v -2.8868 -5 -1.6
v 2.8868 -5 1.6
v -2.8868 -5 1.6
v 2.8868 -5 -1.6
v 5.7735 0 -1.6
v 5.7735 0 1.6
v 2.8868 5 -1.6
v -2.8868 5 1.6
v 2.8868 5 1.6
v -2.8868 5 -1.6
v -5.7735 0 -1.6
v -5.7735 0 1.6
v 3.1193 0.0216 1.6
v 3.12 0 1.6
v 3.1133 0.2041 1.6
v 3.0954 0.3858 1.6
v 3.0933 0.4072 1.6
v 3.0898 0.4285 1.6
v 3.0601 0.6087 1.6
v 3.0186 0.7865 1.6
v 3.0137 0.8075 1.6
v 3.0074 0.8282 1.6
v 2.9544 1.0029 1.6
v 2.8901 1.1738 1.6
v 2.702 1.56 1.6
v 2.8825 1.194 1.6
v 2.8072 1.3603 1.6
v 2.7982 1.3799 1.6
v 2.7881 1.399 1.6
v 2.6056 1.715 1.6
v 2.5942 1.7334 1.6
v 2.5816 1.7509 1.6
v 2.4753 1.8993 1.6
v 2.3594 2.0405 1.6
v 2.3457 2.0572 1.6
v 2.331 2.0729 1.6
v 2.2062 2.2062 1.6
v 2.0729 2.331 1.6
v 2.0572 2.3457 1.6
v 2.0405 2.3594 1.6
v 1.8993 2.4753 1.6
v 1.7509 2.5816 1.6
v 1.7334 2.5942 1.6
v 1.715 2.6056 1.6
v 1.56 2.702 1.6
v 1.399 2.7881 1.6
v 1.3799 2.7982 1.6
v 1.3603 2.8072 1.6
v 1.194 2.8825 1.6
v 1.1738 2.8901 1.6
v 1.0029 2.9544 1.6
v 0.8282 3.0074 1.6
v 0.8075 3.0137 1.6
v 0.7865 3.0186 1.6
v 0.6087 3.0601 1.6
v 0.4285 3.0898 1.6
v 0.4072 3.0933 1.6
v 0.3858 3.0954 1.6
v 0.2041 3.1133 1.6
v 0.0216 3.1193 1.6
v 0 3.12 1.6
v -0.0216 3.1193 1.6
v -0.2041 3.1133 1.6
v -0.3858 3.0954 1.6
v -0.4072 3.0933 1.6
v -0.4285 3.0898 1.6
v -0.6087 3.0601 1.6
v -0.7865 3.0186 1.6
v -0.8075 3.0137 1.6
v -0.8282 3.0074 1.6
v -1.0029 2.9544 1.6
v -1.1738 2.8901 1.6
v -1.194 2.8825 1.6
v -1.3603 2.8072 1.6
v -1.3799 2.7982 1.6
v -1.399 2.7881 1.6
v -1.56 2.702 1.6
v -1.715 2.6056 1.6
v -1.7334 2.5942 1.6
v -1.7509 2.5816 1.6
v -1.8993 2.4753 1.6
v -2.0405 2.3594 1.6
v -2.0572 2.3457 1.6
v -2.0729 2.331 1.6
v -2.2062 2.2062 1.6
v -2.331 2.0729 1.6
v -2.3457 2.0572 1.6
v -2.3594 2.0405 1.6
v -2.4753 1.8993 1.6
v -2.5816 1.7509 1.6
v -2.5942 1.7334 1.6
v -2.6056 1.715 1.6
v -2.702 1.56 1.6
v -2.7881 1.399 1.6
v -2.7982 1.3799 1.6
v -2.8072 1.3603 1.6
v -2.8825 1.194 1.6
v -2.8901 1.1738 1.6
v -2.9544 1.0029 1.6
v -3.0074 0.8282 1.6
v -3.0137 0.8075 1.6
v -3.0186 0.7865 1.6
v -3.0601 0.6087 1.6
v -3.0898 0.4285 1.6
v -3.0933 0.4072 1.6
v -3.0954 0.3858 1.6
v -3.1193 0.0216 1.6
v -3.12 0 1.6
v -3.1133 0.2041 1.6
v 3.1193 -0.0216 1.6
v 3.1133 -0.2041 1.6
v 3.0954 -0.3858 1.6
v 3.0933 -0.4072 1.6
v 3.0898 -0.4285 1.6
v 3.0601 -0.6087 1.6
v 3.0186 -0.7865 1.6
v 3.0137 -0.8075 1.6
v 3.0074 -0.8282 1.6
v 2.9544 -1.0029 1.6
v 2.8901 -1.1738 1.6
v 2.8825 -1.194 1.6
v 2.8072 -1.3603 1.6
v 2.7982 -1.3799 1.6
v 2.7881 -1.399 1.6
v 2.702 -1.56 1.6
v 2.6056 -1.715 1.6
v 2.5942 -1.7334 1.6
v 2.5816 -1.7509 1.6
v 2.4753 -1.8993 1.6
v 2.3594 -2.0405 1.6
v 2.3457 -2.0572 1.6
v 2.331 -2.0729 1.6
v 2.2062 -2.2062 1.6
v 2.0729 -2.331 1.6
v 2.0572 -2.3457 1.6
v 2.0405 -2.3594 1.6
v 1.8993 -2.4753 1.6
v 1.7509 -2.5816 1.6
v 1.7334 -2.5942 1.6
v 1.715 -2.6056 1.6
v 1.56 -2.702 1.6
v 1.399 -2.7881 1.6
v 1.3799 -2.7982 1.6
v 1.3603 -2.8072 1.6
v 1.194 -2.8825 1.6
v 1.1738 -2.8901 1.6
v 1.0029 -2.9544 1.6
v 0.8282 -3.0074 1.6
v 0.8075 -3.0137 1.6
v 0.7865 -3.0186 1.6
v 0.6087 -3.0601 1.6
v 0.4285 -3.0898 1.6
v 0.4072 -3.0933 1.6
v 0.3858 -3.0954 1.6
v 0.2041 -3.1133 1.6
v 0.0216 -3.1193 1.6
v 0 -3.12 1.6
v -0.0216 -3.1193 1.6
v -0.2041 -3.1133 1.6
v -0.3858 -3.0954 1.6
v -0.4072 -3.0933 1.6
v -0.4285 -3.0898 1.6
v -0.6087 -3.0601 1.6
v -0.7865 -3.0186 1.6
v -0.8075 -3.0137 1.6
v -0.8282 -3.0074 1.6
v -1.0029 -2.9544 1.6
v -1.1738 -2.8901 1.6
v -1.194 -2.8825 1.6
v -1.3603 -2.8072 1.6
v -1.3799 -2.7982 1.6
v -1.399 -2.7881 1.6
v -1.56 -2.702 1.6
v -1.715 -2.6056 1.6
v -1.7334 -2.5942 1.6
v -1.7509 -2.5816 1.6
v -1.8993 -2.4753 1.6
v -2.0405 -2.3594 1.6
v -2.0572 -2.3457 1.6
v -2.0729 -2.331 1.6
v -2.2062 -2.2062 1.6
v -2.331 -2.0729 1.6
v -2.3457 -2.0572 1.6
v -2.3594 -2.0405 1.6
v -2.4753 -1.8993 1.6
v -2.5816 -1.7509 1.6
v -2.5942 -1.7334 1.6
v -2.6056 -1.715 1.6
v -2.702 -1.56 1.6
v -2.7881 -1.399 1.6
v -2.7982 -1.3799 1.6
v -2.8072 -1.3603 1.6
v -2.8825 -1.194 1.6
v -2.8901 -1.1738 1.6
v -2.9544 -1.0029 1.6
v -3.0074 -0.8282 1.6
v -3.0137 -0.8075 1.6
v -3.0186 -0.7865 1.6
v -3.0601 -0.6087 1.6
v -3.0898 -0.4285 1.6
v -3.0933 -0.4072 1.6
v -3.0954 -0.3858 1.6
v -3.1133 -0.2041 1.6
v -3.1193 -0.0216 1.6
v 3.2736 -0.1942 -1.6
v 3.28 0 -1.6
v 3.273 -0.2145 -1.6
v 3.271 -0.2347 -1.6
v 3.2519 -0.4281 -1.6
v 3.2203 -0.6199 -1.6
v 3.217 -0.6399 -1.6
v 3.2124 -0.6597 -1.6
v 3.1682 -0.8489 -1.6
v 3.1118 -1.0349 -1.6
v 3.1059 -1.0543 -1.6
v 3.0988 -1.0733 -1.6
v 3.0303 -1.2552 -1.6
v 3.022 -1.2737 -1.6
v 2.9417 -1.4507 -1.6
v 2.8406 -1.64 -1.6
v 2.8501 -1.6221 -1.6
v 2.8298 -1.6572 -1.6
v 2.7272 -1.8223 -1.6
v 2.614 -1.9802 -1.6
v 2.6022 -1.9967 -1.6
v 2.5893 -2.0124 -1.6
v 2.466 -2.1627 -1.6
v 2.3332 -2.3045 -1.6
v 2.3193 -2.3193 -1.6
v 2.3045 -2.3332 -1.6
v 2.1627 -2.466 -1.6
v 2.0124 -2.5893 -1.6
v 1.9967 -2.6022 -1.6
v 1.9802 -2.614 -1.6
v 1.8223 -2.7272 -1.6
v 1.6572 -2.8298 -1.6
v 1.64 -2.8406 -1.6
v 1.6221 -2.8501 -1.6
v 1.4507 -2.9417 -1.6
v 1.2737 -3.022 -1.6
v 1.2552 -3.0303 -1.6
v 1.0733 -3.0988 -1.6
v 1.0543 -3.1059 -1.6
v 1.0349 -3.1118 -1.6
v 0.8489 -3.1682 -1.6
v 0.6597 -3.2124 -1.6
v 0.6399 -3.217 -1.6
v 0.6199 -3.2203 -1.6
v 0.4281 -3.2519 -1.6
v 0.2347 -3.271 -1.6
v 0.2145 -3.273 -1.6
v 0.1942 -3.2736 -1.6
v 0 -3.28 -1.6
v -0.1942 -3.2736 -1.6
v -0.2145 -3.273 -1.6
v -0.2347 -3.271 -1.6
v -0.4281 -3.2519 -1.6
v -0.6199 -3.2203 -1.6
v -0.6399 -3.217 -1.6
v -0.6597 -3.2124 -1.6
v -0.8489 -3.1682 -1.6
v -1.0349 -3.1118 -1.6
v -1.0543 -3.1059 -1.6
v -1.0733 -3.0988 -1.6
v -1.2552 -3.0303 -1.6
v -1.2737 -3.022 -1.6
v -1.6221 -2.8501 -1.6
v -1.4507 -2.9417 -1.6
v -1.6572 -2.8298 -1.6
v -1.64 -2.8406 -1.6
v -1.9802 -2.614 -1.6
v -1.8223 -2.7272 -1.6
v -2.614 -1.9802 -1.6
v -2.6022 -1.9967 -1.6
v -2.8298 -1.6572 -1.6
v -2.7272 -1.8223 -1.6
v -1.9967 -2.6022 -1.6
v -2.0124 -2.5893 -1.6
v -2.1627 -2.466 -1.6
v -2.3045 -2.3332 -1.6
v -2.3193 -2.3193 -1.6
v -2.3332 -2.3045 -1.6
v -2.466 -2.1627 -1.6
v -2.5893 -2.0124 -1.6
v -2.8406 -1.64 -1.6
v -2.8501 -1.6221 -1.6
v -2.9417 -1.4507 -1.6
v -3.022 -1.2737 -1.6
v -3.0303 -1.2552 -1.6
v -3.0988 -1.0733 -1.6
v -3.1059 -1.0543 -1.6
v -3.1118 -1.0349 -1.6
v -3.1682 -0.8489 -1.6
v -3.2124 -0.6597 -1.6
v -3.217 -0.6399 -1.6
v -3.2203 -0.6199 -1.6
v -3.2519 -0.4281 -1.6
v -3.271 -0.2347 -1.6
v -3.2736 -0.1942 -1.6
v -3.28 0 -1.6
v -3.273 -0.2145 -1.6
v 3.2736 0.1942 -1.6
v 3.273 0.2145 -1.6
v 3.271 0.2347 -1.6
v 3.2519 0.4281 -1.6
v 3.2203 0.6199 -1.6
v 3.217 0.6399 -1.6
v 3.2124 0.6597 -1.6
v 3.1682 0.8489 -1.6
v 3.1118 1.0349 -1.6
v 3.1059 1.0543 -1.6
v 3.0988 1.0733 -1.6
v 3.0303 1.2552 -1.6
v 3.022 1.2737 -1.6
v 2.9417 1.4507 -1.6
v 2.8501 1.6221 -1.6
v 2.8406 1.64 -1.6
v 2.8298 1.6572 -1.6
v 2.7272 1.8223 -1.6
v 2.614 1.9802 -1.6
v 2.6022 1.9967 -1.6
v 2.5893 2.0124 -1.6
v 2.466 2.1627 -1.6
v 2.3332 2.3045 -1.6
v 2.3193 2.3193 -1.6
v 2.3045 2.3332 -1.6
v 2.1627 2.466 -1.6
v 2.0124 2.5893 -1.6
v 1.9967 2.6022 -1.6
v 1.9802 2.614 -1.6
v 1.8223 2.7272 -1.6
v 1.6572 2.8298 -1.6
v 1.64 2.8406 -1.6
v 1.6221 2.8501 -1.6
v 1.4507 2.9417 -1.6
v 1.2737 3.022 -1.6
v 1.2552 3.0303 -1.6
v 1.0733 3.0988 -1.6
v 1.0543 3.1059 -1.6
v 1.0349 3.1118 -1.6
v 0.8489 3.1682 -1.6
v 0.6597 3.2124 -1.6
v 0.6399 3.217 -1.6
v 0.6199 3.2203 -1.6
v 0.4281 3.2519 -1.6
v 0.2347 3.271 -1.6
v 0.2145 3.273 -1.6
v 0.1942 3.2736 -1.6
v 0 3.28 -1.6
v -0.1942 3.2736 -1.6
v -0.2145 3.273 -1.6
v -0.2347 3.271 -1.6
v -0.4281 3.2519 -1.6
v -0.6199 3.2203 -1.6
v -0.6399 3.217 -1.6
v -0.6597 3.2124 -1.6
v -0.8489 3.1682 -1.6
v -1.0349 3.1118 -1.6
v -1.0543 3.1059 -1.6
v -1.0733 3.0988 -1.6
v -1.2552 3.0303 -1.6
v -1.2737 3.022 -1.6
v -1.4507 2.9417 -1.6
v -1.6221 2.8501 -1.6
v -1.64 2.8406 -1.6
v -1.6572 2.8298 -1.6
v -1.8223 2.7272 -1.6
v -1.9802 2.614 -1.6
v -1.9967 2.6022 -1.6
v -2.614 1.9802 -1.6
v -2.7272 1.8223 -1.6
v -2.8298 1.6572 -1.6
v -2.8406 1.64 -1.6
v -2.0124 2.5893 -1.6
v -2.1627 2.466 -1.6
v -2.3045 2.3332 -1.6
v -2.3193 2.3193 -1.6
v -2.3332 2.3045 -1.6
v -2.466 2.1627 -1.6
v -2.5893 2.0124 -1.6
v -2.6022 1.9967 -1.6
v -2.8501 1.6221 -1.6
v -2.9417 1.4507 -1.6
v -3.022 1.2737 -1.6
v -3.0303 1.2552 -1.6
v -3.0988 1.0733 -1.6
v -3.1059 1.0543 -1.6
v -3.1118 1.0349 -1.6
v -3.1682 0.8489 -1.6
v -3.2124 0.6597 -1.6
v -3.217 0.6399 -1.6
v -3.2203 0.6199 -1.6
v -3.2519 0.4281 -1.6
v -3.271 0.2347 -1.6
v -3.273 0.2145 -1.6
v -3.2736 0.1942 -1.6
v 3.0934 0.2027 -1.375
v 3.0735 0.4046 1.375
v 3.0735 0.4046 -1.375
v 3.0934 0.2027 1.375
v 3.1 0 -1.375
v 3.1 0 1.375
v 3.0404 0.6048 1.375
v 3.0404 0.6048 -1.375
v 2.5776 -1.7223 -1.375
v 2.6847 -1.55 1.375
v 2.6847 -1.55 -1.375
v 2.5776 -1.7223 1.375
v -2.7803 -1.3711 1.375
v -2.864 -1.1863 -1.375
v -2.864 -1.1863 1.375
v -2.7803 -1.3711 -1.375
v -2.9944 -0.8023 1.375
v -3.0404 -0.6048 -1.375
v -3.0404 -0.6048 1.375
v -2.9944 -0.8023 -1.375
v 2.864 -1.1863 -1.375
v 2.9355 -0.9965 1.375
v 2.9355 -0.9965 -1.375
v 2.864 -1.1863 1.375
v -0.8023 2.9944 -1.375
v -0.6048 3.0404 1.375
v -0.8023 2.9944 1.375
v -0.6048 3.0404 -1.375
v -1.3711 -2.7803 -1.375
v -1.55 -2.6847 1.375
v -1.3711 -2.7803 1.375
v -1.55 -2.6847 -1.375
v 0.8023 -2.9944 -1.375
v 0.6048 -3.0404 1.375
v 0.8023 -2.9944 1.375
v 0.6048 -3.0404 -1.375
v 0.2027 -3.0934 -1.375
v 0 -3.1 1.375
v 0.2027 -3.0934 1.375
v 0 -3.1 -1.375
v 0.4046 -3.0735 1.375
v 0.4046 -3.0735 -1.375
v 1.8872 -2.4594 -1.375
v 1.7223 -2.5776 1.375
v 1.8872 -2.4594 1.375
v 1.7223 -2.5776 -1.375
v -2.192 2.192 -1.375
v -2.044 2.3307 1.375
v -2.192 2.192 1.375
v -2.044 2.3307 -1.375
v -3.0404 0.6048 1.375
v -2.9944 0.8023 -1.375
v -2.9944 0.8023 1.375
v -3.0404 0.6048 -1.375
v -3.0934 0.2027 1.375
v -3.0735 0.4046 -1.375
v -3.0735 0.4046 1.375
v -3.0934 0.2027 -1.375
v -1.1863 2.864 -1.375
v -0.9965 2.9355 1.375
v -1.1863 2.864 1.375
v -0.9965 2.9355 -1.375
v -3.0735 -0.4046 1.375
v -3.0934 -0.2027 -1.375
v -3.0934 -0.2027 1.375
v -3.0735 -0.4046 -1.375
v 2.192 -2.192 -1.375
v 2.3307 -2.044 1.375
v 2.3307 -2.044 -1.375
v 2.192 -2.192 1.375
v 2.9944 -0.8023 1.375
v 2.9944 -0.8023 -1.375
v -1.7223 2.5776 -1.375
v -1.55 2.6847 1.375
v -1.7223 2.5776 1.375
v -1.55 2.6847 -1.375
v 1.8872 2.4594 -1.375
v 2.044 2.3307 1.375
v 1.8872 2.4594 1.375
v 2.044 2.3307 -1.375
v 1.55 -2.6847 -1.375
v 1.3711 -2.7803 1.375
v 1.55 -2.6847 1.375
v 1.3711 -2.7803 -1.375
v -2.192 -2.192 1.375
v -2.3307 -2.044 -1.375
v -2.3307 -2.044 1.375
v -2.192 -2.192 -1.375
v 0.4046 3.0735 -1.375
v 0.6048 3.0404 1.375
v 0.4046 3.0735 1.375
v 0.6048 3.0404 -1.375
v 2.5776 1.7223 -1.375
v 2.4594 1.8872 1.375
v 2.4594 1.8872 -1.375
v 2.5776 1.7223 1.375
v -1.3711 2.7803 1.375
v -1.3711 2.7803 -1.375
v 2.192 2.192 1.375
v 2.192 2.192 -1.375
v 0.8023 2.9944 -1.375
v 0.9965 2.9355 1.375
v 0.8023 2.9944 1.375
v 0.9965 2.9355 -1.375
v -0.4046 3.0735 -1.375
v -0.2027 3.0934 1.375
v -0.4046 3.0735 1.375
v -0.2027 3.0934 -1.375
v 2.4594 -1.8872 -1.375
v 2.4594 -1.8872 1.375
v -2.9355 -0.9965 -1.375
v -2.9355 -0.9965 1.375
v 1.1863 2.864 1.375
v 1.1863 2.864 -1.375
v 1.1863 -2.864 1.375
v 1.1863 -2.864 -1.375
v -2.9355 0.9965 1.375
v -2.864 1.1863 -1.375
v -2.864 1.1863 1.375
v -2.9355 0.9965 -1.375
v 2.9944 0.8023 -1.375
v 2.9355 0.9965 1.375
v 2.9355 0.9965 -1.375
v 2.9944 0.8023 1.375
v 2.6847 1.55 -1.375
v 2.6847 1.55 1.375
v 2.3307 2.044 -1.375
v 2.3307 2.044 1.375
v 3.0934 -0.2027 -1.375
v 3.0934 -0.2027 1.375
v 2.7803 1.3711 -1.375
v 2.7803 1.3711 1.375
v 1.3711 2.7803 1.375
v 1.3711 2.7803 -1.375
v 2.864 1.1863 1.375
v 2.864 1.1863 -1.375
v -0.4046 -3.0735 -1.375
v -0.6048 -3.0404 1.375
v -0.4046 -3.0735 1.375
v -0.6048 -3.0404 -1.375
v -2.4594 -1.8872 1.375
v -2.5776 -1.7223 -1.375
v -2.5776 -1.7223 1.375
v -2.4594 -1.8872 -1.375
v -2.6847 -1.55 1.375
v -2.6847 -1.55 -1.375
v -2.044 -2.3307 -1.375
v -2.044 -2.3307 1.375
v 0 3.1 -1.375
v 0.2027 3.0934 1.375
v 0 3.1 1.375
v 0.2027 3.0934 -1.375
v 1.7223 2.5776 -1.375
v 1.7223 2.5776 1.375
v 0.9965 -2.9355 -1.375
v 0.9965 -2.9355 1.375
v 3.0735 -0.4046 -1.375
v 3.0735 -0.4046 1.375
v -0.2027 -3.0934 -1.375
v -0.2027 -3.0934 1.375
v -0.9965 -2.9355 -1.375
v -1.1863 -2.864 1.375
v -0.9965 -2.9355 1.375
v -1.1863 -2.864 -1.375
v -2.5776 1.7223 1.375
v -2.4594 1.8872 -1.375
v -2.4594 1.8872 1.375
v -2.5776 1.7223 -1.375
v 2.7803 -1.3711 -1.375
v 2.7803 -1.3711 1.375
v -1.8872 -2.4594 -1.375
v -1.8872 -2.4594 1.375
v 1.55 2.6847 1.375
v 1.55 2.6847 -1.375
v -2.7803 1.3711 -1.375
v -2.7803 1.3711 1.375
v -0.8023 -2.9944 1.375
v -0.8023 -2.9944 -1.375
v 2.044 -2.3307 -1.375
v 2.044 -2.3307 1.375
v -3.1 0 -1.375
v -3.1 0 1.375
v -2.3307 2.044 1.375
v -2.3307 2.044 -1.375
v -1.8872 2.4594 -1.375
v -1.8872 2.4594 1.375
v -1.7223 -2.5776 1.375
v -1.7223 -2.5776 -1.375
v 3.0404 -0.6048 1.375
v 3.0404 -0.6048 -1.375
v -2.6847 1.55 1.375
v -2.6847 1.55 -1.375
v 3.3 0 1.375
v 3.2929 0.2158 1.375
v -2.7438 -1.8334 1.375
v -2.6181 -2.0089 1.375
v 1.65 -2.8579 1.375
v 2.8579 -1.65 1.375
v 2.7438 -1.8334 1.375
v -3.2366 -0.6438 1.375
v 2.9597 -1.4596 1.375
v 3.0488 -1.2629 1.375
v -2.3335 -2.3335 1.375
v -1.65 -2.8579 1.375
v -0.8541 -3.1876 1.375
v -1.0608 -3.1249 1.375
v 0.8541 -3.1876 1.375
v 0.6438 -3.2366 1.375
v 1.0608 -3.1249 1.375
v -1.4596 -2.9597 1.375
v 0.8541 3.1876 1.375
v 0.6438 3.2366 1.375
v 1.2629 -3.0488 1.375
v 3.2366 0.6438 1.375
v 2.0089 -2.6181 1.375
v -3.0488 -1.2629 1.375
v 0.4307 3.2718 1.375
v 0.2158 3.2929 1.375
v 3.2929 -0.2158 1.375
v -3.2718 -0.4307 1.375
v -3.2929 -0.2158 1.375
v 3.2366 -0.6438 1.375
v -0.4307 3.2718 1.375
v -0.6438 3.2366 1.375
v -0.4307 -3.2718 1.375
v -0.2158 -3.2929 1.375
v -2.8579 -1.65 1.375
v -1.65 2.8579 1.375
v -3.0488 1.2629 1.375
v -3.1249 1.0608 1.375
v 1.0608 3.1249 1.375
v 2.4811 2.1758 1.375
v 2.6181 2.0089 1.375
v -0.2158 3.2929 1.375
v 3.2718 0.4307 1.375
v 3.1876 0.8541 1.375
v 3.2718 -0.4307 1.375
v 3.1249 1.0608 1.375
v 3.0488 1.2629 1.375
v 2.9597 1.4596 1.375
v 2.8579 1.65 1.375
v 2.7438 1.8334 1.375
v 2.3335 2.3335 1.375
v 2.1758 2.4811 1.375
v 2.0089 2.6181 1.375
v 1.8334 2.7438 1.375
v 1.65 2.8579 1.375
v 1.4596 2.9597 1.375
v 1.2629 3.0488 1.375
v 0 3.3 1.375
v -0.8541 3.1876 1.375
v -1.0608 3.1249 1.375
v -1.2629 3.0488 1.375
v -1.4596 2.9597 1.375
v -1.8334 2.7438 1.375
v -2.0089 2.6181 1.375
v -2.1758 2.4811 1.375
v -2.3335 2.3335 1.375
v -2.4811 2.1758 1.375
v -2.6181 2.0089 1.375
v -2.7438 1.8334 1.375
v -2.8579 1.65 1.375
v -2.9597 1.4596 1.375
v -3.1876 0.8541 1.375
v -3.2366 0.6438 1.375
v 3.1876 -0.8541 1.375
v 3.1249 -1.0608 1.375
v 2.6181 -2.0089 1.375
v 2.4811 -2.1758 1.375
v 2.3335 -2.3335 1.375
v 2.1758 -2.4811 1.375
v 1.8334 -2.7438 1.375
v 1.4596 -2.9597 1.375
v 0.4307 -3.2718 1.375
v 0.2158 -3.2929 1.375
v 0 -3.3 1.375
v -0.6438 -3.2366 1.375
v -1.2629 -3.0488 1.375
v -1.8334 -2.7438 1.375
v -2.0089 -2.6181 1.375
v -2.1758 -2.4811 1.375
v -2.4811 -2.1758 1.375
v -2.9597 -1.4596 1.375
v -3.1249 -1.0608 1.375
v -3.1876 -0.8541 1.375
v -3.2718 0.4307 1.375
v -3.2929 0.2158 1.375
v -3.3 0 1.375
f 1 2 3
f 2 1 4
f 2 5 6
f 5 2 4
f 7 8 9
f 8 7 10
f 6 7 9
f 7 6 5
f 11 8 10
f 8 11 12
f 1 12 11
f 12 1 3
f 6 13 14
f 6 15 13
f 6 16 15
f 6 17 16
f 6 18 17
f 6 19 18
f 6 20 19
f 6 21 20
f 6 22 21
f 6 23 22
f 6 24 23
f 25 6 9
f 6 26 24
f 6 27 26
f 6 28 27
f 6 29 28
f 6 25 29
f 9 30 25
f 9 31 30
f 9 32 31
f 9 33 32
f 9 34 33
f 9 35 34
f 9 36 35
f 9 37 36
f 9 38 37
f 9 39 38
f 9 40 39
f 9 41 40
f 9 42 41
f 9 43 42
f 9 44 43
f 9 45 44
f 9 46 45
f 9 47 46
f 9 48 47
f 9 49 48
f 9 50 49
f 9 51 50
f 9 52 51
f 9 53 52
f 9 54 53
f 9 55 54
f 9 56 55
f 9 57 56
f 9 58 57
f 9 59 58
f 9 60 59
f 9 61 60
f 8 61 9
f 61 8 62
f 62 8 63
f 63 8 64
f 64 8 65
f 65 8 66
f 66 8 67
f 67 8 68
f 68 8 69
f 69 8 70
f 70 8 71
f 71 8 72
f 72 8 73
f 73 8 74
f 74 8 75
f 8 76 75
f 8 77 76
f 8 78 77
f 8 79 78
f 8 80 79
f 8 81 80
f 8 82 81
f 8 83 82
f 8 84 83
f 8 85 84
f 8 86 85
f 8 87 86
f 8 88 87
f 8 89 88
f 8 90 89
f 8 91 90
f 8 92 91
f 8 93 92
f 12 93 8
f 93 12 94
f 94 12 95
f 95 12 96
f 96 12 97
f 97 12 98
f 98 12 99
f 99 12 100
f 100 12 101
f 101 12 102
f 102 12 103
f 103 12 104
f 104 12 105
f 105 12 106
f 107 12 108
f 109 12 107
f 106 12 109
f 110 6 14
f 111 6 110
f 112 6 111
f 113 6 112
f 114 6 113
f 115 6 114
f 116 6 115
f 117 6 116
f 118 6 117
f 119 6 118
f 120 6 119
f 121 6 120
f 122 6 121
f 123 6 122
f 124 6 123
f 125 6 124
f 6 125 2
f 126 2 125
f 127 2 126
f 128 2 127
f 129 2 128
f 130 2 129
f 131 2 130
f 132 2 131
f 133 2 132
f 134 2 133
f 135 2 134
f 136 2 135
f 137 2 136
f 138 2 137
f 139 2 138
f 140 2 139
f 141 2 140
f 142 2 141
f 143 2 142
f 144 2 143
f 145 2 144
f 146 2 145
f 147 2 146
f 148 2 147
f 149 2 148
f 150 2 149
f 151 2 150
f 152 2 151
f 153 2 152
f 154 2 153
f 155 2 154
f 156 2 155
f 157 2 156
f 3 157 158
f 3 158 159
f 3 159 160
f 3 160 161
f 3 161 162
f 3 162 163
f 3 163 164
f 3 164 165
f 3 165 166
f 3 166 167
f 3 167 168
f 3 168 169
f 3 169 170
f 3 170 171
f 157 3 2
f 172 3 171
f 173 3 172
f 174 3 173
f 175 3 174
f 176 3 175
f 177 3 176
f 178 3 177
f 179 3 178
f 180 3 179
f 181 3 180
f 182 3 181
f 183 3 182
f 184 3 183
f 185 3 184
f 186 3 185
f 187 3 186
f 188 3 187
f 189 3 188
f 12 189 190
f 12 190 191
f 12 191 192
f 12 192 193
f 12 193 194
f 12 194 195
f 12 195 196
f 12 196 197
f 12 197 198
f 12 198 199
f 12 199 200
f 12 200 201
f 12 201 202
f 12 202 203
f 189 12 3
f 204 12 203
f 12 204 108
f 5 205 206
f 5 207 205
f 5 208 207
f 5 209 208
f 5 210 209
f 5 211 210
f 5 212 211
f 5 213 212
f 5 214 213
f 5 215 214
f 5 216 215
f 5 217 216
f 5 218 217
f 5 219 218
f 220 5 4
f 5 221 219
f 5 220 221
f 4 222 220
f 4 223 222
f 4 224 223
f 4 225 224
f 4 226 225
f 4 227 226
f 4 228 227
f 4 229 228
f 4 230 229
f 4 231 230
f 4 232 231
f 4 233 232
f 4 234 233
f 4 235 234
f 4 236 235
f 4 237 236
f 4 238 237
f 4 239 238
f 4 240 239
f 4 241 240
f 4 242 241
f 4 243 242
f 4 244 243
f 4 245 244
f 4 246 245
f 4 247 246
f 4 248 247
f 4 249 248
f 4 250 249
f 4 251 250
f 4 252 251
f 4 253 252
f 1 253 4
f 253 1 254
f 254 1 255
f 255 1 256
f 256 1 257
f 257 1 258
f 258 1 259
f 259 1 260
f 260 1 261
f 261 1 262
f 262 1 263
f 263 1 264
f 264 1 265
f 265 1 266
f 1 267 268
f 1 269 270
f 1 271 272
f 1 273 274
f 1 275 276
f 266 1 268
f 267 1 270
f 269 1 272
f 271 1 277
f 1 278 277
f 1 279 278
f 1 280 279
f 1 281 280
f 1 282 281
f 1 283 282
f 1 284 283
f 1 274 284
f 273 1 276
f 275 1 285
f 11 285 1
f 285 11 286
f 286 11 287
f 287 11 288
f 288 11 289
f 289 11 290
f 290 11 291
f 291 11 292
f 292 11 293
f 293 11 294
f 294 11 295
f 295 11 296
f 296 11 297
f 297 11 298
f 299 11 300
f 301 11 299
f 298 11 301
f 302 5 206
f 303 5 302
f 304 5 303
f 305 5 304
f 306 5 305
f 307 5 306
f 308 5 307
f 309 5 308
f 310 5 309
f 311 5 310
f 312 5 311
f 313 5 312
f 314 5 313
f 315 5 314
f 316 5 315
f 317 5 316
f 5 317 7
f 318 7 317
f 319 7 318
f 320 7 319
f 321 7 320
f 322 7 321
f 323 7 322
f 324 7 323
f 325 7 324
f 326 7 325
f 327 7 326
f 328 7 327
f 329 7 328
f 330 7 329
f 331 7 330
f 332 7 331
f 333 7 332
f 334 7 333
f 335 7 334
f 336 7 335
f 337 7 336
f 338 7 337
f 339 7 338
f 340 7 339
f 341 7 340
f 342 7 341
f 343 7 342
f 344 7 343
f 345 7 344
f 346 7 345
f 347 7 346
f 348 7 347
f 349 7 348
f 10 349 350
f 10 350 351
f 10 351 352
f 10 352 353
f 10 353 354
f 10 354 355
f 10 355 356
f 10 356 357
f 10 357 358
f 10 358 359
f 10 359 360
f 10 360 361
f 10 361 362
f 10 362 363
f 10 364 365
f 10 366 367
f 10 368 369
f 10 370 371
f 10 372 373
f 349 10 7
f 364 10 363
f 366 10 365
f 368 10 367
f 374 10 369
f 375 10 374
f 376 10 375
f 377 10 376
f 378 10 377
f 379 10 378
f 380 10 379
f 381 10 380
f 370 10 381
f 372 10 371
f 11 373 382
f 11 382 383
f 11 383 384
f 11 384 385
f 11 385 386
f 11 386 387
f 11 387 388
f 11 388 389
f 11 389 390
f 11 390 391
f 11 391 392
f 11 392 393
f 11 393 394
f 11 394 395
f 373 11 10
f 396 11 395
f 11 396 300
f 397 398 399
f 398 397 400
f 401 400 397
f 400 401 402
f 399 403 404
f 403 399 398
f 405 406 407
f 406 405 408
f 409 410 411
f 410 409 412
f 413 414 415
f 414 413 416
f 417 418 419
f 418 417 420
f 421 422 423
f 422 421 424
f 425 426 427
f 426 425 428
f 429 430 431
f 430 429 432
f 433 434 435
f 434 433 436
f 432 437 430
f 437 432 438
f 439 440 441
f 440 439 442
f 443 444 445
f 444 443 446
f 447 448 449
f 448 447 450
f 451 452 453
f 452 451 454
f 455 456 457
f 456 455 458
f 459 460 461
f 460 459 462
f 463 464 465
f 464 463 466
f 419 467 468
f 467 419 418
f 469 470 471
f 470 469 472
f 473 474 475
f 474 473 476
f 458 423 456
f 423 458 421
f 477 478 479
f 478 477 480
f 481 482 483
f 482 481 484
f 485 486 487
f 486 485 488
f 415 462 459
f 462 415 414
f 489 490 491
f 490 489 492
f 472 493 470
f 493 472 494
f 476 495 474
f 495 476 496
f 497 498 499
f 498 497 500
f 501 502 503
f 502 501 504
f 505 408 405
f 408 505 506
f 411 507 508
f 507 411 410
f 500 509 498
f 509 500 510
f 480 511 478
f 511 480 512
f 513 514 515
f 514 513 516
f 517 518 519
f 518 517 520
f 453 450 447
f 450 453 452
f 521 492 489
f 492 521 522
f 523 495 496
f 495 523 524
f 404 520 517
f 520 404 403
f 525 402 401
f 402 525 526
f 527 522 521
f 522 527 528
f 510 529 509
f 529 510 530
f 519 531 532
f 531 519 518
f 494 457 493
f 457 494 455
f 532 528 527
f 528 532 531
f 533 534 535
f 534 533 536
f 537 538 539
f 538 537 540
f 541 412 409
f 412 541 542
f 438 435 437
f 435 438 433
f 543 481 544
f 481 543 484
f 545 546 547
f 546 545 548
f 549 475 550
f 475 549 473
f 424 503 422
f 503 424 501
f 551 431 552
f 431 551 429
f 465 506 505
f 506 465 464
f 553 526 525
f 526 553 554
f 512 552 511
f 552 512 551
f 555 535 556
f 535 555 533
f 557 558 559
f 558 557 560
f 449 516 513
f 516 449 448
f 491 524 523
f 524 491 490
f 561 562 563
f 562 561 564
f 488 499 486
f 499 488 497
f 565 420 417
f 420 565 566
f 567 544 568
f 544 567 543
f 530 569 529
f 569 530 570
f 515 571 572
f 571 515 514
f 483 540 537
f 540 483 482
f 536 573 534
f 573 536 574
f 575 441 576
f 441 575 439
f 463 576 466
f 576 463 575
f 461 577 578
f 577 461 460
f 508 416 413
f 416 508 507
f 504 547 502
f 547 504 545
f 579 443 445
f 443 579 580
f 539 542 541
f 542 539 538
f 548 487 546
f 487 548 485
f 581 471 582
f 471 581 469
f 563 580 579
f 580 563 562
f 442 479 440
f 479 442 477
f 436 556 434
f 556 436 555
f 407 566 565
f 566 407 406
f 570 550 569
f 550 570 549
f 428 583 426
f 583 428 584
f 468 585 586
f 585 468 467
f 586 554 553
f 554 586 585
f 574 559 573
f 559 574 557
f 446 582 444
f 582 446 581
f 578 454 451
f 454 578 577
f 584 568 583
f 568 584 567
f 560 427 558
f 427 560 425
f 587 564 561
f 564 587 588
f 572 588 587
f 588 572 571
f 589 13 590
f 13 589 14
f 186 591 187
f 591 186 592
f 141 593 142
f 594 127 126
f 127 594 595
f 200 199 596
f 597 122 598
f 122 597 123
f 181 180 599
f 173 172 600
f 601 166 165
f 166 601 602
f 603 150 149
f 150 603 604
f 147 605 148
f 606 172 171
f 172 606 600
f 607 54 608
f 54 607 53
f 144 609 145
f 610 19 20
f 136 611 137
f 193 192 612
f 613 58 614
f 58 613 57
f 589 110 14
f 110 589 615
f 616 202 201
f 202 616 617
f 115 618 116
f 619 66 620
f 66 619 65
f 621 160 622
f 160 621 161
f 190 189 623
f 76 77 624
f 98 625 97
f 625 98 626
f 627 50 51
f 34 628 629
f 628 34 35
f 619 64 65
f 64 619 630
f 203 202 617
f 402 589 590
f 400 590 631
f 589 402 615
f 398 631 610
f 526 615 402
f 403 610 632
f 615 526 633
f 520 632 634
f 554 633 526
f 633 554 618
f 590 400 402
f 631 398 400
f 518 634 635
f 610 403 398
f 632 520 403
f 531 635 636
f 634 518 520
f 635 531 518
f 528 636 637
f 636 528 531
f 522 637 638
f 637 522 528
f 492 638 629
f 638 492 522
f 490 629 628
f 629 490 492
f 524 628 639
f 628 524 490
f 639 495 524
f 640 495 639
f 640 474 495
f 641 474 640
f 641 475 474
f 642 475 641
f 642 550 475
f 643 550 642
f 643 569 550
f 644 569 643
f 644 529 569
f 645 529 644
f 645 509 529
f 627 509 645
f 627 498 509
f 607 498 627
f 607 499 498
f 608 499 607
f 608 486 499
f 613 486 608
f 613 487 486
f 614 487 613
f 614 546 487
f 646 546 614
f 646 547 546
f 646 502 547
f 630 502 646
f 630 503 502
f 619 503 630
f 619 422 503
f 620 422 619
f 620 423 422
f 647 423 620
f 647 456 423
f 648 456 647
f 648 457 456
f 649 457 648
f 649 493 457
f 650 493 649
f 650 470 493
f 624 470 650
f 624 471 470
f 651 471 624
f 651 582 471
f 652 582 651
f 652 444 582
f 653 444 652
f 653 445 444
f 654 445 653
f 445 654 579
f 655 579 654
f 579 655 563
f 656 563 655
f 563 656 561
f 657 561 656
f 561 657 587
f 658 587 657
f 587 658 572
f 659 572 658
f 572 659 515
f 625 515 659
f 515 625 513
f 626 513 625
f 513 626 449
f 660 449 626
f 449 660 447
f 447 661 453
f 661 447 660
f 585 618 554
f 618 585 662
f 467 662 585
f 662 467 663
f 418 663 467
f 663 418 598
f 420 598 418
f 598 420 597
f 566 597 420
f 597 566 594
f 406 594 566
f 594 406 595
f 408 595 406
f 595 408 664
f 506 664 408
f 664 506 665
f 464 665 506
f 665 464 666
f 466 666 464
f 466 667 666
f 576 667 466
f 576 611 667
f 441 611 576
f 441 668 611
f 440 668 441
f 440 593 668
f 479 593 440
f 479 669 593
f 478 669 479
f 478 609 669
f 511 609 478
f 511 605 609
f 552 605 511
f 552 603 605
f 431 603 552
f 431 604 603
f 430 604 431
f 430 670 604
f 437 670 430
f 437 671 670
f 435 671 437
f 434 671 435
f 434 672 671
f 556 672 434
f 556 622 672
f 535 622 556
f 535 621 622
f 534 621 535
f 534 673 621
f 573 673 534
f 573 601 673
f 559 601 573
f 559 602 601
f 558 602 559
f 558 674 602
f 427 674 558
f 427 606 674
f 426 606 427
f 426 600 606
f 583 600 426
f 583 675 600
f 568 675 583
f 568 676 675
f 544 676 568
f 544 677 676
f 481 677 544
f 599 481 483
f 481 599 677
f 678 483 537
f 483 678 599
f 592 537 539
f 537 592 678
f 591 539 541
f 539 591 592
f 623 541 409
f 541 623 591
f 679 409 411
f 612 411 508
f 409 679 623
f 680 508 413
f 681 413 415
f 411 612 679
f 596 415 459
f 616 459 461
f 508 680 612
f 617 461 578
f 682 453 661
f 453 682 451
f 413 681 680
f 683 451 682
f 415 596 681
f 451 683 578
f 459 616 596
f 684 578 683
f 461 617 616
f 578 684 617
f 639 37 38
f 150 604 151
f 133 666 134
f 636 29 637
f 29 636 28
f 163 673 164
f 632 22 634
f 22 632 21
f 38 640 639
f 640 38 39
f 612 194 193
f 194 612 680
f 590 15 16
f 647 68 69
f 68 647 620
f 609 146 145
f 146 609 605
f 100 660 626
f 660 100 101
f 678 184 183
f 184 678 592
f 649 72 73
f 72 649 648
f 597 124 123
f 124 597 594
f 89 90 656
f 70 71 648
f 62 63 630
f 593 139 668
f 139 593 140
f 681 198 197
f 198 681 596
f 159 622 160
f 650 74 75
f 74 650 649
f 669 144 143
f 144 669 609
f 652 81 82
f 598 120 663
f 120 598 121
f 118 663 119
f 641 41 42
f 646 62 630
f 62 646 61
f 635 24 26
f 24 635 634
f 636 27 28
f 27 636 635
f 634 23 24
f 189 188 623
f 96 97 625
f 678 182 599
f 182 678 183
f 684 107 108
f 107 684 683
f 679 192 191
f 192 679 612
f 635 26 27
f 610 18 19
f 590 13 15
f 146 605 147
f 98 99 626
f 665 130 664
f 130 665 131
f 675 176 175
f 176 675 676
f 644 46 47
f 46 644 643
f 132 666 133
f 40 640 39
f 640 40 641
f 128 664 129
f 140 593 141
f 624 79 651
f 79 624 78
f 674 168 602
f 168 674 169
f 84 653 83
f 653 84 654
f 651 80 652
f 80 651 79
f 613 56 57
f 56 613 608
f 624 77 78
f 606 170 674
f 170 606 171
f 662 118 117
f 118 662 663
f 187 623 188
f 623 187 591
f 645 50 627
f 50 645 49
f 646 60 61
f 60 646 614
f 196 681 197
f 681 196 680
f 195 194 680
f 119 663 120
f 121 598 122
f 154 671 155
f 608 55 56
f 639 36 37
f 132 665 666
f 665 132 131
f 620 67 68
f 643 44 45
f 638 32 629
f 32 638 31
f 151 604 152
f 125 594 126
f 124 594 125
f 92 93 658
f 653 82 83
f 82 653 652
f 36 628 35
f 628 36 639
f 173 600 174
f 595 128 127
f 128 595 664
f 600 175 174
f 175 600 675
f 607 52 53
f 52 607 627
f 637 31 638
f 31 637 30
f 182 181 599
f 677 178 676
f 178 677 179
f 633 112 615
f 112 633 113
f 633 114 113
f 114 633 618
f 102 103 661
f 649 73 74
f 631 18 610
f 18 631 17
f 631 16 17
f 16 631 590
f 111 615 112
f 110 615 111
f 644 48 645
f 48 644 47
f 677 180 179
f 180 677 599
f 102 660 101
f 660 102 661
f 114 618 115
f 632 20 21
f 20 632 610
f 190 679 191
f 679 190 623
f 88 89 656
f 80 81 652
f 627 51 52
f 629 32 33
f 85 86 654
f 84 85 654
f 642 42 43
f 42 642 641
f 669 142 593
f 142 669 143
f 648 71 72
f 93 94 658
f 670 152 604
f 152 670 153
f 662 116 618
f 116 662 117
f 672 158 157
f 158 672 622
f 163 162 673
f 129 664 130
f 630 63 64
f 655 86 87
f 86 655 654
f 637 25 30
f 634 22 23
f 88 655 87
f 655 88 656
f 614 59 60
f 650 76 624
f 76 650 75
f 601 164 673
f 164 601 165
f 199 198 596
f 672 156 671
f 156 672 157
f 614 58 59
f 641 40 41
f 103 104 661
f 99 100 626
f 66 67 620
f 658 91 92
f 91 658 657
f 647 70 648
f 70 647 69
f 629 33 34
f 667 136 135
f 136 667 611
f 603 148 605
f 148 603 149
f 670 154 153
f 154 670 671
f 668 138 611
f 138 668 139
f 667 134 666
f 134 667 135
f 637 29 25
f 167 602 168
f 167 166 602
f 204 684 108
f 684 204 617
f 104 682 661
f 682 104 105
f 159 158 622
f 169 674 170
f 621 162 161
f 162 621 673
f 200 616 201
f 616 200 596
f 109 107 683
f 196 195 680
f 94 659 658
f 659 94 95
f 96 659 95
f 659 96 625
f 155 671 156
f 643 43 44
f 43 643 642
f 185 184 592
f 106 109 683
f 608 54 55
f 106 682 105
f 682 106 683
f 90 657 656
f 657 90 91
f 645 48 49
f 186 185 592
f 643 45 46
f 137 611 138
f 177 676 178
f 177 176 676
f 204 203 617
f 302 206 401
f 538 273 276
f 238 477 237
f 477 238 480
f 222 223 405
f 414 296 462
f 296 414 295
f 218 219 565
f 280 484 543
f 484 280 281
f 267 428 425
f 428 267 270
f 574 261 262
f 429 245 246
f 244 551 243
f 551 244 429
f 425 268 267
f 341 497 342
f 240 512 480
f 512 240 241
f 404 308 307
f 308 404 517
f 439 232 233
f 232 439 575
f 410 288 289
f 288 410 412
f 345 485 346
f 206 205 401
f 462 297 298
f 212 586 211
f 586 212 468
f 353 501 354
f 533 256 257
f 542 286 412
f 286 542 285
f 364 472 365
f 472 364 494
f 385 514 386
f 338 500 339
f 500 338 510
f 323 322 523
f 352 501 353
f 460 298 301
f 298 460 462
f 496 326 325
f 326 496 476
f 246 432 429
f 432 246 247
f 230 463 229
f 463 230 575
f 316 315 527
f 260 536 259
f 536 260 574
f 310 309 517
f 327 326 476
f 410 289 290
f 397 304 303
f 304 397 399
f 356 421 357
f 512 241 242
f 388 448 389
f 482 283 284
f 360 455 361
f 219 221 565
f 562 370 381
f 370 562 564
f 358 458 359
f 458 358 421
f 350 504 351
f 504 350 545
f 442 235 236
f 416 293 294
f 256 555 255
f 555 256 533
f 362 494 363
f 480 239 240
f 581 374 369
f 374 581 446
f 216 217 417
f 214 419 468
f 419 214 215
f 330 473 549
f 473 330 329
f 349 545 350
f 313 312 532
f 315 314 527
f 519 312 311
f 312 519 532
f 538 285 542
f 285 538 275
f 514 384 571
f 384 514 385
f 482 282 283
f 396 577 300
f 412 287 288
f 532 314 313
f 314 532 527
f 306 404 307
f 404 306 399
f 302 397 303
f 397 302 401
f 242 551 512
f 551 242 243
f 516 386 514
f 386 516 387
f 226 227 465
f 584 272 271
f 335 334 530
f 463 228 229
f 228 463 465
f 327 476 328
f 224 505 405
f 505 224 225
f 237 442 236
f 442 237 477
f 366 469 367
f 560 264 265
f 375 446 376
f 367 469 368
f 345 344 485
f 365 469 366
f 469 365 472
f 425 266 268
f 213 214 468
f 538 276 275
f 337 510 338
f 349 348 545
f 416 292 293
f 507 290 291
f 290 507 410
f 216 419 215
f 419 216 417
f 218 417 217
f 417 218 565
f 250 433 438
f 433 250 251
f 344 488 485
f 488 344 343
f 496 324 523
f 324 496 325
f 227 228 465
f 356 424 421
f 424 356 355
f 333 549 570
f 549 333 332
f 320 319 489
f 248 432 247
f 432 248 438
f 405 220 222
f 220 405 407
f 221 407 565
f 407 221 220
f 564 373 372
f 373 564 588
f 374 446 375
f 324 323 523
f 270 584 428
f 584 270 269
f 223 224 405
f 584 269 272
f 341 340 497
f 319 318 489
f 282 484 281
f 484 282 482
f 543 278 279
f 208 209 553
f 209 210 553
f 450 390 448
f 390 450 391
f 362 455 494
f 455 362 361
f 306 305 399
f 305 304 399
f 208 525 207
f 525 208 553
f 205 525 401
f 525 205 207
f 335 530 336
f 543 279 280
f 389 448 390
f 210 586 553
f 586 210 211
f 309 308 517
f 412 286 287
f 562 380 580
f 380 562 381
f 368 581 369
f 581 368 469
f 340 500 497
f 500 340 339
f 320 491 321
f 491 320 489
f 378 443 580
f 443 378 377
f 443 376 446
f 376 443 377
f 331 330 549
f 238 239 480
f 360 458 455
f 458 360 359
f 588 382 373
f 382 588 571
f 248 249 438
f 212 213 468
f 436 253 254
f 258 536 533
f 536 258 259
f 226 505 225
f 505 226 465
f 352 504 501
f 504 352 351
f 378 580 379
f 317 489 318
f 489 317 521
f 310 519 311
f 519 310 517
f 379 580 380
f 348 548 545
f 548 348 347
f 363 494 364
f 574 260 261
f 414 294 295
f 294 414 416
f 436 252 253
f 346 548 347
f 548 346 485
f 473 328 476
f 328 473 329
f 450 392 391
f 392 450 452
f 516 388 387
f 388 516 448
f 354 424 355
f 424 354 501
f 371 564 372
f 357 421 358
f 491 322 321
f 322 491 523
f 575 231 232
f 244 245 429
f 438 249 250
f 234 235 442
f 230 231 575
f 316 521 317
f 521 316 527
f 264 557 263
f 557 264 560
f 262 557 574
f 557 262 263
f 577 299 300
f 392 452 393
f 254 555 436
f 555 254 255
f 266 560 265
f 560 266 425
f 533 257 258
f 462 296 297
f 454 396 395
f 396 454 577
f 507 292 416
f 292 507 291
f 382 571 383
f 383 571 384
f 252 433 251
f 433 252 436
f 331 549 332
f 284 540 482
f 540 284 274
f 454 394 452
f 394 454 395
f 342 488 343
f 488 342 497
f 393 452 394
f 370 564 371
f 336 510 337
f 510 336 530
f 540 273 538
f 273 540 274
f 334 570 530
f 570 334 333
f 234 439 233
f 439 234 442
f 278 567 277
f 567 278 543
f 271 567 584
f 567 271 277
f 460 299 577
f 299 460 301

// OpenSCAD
// Thin hex nut for 6.0mm screw, 10.0mm across flats, 3.2mm thick
thread_diameter = 6.0;          // screw major diameter
across_flats    = 10.0;         // hex AF
thickness       = 3.2;          // nut thickness
hole_clearance  = 0.2;          // clearance on diameter
edge_chamfer    = 0.2;          // small lead-in on hole (both sides)
eps             = 0.05;

$fn = 96;

// Derived
hex_R = across_flats / sqrt(3);                 // circumradius for AF hex
hole_r = (thread_diameter + hole_clearance)/2;  // clearance hole radius

module thin_hex_nut() {
  difference() {
    // Outer hex prism
    cylinder(r=hex_R, h=thickness, center=true, $fn=6);

    // Through hole
    cylinder(r=hole_r, h=thickness + 2*eps, center=true, $fn=96);

    // Lead-in chamfers on the hole (remove material only near faces)
    translate([0,0, thickness/2 - edge_chamfer/2])
      cylinder(r1=hole_r + edge_chamfer, r2=hole_r, h=edge_chamfer + eps, center=true, $fn=96);

    translate([0,0,-thickness/2 + edge_chamfer/2])
      cylinder(r1=hole_r + edge_chamfer, r2=hole_r, h=edge_chamfer + eps, center=true, $fn=96);
  }
}

thin_hex_nut();
